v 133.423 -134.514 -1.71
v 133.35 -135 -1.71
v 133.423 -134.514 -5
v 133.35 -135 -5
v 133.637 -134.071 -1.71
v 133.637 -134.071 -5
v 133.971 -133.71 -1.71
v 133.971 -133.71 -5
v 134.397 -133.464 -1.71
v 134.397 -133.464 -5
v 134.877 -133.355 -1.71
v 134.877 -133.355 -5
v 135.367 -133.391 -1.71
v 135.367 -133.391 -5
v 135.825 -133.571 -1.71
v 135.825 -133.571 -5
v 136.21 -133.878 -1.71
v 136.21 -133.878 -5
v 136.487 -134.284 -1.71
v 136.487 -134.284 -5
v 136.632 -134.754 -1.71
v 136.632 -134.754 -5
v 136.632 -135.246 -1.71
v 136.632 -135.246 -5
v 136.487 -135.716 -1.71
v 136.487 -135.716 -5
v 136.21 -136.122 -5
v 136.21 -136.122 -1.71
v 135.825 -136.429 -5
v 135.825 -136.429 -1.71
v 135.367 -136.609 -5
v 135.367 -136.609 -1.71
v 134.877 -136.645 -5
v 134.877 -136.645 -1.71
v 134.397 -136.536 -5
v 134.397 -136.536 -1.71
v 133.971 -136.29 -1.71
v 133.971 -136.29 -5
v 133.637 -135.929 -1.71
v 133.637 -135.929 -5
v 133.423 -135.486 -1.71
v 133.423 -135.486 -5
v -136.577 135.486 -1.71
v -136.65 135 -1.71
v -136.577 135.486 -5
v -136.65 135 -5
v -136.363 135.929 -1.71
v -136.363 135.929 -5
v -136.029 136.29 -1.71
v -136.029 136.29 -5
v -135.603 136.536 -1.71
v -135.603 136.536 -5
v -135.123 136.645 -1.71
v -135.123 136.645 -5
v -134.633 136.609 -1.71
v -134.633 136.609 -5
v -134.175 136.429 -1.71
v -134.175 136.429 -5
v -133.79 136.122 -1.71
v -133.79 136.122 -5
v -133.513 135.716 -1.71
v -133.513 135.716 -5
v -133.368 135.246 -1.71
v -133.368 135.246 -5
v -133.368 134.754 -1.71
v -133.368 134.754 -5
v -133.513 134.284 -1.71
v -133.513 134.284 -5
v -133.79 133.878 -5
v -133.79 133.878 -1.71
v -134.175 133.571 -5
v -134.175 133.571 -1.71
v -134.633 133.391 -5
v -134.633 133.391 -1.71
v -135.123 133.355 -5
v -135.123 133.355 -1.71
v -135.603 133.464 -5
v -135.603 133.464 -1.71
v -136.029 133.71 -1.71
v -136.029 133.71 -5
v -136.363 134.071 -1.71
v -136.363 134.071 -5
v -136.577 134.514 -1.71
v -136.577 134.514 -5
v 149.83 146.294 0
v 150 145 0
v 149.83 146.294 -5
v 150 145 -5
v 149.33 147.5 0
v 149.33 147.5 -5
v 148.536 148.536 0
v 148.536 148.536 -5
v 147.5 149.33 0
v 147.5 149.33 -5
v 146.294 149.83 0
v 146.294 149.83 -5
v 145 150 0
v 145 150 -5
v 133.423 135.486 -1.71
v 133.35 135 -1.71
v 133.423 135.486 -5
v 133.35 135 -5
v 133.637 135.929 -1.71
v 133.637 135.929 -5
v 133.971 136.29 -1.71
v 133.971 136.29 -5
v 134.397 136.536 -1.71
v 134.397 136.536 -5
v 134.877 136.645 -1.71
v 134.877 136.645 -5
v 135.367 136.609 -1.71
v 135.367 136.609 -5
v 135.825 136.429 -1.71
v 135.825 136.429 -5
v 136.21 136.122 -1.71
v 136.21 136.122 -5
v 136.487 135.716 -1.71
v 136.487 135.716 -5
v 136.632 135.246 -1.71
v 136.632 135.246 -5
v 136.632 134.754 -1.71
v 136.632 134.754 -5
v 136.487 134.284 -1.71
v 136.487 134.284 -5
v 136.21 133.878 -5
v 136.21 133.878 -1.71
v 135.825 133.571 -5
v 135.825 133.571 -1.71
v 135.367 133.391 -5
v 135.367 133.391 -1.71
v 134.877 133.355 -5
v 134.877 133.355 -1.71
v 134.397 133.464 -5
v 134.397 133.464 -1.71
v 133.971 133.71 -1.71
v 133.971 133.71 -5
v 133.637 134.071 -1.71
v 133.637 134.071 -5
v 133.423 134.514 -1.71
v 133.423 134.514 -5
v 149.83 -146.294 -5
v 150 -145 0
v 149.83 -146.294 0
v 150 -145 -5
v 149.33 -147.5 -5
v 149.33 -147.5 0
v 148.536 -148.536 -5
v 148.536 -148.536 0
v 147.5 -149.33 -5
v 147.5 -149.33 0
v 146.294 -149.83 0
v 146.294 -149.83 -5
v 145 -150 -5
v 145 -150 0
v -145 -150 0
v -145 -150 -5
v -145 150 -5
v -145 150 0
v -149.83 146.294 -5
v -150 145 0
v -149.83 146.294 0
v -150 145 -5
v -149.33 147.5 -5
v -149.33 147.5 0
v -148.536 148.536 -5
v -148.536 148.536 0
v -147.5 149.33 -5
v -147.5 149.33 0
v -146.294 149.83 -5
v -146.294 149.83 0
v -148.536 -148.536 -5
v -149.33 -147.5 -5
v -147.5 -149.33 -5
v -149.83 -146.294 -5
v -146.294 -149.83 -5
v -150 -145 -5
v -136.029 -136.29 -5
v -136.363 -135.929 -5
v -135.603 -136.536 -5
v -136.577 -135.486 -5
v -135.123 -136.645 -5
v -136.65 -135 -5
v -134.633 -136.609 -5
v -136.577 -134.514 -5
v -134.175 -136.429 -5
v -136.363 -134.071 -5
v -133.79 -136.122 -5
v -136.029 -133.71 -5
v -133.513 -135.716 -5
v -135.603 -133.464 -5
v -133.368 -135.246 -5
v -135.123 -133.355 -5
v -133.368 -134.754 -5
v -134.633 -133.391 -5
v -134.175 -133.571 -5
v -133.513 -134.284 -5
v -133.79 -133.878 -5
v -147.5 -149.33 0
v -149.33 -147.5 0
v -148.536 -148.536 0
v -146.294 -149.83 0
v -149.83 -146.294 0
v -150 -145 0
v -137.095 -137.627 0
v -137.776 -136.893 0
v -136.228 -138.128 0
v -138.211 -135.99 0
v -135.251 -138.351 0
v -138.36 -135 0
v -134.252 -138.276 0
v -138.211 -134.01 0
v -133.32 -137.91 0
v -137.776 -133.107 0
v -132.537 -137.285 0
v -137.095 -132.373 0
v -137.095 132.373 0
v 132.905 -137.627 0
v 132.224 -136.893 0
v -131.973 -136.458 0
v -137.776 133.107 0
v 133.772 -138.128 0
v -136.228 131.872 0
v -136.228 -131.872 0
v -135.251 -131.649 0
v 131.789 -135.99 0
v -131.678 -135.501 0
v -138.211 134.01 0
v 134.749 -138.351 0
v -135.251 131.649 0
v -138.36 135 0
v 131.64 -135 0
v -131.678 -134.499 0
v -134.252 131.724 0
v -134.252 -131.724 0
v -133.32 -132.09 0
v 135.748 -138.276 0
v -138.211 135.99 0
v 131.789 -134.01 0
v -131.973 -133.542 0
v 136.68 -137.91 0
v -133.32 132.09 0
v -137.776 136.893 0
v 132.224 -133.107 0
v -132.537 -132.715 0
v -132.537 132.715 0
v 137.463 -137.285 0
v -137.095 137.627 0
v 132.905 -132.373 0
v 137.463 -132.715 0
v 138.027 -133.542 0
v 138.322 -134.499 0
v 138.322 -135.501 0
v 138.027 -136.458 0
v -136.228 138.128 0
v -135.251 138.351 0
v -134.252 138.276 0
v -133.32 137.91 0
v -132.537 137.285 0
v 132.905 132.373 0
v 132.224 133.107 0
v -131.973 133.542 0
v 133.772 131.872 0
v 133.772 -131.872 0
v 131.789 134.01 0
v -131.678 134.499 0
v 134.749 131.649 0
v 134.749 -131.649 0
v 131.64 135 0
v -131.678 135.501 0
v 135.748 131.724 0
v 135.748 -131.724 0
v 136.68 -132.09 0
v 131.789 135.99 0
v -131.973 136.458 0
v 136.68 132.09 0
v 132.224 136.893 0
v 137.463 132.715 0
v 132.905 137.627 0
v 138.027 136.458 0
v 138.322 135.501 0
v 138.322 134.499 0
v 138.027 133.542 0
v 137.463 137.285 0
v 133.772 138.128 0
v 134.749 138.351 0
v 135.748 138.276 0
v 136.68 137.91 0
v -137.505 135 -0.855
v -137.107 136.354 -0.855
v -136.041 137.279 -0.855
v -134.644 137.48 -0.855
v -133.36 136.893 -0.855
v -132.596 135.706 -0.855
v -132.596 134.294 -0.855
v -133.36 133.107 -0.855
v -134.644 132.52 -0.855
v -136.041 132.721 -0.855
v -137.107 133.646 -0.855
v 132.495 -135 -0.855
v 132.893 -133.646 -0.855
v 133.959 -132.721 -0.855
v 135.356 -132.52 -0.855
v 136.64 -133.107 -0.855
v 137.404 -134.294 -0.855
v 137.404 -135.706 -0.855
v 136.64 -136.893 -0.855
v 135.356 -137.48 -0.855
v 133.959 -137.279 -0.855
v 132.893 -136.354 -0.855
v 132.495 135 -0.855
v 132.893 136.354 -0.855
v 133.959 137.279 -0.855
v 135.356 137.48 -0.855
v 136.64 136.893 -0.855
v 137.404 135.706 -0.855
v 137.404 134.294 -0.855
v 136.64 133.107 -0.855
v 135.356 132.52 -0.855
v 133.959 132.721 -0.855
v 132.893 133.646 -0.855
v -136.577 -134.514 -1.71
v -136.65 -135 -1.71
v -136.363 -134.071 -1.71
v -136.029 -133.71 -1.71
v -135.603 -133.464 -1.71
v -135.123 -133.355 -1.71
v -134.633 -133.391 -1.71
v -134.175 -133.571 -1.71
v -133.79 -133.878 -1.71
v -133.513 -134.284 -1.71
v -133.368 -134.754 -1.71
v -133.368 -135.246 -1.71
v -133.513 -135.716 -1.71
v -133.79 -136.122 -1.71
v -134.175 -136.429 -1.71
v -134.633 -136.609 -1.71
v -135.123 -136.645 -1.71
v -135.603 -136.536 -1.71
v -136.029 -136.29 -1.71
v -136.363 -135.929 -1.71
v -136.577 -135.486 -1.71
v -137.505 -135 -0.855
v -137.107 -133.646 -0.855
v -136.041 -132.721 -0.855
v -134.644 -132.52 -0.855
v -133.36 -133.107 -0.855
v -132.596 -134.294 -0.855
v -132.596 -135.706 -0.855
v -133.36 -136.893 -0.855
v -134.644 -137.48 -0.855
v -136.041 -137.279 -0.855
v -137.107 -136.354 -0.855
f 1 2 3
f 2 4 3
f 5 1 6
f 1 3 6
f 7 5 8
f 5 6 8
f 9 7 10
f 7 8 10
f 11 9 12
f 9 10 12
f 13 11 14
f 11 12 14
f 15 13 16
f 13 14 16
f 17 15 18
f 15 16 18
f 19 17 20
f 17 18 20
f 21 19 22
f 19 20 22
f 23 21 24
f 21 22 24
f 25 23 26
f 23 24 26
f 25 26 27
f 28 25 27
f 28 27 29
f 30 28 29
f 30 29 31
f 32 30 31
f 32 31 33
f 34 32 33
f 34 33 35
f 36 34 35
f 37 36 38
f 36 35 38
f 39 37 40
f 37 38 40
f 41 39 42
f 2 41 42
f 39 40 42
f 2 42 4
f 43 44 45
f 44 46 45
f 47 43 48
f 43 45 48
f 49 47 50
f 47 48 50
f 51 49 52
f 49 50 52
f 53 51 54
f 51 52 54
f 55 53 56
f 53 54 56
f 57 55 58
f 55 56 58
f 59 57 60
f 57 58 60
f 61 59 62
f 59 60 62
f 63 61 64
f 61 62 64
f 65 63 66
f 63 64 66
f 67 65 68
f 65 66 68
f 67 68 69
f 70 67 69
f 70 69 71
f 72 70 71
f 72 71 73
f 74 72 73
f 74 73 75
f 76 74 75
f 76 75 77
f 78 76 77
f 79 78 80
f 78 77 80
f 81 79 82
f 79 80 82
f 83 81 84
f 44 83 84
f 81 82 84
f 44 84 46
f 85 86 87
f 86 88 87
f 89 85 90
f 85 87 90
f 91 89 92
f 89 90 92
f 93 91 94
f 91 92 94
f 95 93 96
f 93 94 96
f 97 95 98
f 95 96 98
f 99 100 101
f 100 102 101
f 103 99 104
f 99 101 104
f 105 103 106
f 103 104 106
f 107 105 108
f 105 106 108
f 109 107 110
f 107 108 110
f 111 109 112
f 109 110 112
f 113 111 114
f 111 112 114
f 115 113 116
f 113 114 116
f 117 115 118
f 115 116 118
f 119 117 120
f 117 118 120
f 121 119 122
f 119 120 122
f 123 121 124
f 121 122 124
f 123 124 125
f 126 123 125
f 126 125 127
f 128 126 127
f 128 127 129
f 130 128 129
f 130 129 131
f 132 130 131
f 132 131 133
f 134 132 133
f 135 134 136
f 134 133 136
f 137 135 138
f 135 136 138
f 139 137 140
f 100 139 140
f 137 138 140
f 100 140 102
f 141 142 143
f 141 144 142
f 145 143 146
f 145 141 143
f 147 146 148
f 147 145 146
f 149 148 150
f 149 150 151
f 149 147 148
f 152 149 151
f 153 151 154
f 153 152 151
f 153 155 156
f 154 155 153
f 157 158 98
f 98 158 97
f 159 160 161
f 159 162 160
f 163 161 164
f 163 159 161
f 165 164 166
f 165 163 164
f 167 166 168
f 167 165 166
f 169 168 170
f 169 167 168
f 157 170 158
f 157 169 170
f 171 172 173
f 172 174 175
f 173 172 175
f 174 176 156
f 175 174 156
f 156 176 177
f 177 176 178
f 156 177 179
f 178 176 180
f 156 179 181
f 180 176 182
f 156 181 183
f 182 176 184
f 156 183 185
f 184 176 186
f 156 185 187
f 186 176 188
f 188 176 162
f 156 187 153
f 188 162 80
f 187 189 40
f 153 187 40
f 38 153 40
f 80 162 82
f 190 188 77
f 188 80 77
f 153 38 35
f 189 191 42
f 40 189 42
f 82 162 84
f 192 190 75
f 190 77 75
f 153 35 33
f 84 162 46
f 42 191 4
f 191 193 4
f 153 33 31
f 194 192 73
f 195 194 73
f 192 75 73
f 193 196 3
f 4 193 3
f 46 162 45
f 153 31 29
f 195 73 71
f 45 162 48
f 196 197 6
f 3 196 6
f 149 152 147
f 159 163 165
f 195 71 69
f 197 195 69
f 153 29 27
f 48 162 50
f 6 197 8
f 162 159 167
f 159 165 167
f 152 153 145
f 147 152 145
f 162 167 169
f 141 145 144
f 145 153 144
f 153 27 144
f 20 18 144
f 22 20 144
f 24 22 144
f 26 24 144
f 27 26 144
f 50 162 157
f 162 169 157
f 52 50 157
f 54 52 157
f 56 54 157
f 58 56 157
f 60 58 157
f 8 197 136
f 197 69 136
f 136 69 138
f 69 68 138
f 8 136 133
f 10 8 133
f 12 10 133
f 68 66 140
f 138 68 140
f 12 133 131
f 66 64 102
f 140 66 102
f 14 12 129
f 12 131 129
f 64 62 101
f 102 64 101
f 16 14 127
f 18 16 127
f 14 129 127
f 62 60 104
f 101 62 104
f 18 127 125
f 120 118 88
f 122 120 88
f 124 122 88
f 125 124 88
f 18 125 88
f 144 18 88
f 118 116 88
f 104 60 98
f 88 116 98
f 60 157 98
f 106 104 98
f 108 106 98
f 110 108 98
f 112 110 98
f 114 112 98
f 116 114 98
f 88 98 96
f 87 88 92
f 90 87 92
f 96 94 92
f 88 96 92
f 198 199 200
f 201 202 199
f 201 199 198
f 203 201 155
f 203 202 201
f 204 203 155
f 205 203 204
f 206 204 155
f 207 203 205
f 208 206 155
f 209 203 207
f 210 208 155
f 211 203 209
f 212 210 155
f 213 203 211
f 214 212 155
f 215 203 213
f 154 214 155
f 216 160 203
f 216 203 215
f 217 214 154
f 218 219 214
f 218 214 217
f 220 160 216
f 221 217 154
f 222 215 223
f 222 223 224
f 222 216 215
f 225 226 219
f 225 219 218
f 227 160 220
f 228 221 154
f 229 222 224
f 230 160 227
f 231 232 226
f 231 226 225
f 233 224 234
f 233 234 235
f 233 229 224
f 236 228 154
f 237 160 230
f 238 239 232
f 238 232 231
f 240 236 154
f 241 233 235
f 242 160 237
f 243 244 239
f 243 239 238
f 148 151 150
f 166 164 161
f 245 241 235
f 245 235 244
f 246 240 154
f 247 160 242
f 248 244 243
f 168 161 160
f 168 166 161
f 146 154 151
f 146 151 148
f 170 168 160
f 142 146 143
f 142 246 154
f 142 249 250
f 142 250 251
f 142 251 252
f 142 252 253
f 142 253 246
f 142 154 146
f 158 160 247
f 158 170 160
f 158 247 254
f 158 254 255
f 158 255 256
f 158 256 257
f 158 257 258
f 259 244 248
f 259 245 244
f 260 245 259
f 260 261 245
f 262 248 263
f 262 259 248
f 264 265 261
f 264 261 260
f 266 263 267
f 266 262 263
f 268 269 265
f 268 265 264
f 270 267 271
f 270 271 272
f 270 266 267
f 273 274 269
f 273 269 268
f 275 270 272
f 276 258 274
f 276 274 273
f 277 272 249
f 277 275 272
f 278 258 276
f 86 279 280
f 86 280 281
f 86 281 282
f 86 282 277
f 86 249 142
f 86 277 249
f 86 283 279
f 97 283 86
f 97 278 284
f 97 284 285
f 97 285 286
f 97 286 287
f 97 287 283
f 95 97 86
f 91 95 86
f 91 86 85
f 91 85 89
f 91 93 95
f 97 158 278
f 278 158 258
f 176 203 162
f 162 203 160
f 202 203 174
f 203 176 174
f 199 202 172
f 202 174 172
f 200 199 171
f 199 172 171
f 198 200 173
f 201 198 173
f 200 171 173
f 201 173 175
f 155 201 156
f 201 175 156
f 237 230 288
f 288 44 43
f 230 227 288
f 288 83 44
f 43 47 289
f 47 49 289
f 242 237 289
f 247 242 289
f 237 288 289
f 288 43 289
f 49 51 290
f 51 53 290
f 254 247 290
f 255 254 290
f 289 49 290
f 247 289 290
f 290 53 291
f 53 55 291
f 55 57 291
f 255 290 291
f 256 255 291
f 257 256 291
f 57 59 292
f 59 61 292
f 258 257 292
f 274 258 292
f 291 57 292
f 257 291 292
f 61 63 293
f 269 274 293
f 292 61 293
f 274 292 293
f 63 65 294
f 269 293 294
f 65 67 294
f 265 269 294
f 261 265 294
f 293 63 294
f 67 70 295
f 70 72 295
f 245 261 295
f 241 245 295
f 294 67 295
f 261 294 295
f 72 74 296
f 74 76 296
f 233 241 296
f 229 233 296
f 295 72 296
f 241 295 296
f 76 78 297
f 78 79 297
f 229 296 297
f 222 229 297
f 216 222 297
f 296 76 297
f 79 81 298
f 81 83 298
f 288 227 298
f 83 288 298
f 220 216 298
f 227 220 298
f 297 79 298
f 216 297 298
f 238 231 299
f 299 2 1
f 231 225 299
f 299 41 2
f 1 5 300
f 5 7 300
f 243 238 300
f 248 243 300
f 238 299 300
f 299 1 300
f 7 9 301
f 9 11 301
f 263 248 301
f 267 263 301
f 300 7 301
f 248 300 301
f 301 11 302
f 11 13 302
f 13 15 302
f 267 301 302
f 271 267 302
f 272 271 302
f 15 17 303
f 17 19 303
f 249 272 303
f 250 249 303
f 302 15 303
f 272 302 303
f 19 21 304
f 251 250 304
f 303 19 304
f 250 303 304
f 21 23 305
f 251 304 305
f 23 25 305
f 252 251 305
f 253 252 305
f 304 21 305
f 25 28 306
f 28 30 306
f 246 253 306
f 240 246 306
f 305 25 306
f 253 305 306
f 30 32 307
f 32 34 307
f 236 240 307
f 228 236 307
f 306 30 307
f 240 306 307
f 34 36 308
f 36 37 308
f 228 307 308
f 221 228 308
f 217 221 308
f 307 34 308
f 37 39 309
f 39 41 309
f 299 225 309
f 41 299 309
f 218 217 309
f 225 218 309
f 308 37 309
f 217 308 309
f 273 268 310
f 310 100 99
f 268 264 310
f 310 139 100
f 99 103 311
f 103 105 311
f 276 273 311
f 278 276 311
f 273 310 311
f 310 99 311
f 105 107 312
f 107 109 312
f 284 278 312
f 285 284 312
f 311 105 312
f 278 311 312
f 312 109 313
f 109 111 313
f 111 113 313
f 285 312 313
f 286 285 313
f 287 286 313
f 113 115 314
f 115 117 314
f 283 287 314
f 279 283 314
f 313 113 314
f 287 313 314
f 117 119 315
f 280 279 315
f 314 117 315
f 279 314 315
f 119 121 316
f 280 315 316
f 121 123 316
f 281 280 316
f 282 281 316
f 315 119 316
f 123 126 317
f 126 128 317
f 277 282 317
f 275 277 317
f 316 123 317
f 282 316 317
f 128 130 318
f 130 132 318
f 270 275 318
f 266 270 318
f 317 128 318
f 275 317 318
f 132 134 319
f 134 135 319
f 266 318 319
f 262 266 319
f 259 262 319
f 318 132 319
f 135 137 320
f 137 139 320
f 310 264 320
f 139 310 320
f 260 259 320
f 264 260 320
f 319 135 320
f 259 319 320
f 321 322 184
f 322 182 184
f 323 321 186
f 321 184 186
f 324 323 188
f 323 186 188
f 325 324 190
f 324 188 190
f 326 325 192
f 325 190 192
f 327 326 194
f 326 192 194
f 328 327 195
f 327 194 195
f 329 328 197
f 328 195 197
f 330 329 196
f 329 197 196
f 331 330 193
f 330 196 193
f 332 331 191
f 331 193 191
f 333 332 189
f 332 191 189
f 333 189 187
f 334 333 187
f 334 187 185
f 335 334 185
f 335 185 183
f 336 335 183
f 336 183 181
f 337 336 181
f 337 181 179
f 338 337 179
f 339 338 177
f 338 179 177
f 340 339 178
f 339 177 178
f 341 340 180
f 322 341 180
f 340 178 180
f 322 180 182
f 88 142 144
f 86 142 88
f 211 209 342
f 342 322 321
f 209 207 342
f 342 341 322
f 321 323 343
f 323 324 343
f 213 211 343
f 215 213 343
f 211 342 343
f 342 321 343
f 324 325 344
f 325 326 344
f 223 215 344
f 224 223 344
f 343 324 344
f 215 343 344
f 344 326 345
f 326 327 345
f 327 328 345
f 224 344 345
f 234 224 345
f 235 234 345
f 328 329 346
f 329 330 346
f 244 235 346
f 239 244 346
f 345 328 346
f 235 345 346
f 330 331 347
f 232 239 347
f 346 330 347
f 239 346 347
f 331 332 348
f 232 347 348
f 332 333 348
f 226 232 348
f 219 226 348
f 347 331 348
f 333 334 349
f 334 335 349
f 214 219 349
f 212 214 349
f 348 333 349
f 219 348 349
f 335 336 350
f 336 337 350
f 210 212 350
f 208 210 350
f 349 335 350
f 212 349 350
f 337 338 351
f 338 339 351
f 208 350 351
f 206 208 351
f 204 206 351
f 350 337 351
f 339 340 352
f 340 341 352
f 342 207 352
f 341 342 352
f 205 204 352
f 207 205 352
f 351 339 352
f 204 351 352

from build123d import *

# Parameters (mm, degrees)
F0_W           = 300
F0_H           = 300
F1_DEPTH       = 5
F2_D           = 3.3
F2_CSINK_D     = 6.72
F2_CSINK_ANGLE = 90
F3_R           = 5


with BuildPart() as f1:
    # F0 (on Top) → F1 (new body)
    with BuildSketch(Plane.XY):
        Rectangle(F0_W, F0_H)
    extrude(amount=-F1_DEPTH)

    # F2 (through all)
    with Locations(Plane.XY):
        with Locations((-135, 135), (-135, -135), (135, -135), (135, 135)):
            CounterSinkHole(F2_D / 2, F2_CSINK_D / 2, counter_sink_angle=F2_CSINK_ANGLE)

    # F3
    f3_edges = [f1.edges().sort_by_distance(p)[0] for p in [
        (-150, 150, -2.5),
        (150, 150, -2.5),
        (150, -150, -2.5),
        (-150, -150, -2.5),
    ]]
    fillet(f3_edges, radius=F3_R)


solid = f1.part
